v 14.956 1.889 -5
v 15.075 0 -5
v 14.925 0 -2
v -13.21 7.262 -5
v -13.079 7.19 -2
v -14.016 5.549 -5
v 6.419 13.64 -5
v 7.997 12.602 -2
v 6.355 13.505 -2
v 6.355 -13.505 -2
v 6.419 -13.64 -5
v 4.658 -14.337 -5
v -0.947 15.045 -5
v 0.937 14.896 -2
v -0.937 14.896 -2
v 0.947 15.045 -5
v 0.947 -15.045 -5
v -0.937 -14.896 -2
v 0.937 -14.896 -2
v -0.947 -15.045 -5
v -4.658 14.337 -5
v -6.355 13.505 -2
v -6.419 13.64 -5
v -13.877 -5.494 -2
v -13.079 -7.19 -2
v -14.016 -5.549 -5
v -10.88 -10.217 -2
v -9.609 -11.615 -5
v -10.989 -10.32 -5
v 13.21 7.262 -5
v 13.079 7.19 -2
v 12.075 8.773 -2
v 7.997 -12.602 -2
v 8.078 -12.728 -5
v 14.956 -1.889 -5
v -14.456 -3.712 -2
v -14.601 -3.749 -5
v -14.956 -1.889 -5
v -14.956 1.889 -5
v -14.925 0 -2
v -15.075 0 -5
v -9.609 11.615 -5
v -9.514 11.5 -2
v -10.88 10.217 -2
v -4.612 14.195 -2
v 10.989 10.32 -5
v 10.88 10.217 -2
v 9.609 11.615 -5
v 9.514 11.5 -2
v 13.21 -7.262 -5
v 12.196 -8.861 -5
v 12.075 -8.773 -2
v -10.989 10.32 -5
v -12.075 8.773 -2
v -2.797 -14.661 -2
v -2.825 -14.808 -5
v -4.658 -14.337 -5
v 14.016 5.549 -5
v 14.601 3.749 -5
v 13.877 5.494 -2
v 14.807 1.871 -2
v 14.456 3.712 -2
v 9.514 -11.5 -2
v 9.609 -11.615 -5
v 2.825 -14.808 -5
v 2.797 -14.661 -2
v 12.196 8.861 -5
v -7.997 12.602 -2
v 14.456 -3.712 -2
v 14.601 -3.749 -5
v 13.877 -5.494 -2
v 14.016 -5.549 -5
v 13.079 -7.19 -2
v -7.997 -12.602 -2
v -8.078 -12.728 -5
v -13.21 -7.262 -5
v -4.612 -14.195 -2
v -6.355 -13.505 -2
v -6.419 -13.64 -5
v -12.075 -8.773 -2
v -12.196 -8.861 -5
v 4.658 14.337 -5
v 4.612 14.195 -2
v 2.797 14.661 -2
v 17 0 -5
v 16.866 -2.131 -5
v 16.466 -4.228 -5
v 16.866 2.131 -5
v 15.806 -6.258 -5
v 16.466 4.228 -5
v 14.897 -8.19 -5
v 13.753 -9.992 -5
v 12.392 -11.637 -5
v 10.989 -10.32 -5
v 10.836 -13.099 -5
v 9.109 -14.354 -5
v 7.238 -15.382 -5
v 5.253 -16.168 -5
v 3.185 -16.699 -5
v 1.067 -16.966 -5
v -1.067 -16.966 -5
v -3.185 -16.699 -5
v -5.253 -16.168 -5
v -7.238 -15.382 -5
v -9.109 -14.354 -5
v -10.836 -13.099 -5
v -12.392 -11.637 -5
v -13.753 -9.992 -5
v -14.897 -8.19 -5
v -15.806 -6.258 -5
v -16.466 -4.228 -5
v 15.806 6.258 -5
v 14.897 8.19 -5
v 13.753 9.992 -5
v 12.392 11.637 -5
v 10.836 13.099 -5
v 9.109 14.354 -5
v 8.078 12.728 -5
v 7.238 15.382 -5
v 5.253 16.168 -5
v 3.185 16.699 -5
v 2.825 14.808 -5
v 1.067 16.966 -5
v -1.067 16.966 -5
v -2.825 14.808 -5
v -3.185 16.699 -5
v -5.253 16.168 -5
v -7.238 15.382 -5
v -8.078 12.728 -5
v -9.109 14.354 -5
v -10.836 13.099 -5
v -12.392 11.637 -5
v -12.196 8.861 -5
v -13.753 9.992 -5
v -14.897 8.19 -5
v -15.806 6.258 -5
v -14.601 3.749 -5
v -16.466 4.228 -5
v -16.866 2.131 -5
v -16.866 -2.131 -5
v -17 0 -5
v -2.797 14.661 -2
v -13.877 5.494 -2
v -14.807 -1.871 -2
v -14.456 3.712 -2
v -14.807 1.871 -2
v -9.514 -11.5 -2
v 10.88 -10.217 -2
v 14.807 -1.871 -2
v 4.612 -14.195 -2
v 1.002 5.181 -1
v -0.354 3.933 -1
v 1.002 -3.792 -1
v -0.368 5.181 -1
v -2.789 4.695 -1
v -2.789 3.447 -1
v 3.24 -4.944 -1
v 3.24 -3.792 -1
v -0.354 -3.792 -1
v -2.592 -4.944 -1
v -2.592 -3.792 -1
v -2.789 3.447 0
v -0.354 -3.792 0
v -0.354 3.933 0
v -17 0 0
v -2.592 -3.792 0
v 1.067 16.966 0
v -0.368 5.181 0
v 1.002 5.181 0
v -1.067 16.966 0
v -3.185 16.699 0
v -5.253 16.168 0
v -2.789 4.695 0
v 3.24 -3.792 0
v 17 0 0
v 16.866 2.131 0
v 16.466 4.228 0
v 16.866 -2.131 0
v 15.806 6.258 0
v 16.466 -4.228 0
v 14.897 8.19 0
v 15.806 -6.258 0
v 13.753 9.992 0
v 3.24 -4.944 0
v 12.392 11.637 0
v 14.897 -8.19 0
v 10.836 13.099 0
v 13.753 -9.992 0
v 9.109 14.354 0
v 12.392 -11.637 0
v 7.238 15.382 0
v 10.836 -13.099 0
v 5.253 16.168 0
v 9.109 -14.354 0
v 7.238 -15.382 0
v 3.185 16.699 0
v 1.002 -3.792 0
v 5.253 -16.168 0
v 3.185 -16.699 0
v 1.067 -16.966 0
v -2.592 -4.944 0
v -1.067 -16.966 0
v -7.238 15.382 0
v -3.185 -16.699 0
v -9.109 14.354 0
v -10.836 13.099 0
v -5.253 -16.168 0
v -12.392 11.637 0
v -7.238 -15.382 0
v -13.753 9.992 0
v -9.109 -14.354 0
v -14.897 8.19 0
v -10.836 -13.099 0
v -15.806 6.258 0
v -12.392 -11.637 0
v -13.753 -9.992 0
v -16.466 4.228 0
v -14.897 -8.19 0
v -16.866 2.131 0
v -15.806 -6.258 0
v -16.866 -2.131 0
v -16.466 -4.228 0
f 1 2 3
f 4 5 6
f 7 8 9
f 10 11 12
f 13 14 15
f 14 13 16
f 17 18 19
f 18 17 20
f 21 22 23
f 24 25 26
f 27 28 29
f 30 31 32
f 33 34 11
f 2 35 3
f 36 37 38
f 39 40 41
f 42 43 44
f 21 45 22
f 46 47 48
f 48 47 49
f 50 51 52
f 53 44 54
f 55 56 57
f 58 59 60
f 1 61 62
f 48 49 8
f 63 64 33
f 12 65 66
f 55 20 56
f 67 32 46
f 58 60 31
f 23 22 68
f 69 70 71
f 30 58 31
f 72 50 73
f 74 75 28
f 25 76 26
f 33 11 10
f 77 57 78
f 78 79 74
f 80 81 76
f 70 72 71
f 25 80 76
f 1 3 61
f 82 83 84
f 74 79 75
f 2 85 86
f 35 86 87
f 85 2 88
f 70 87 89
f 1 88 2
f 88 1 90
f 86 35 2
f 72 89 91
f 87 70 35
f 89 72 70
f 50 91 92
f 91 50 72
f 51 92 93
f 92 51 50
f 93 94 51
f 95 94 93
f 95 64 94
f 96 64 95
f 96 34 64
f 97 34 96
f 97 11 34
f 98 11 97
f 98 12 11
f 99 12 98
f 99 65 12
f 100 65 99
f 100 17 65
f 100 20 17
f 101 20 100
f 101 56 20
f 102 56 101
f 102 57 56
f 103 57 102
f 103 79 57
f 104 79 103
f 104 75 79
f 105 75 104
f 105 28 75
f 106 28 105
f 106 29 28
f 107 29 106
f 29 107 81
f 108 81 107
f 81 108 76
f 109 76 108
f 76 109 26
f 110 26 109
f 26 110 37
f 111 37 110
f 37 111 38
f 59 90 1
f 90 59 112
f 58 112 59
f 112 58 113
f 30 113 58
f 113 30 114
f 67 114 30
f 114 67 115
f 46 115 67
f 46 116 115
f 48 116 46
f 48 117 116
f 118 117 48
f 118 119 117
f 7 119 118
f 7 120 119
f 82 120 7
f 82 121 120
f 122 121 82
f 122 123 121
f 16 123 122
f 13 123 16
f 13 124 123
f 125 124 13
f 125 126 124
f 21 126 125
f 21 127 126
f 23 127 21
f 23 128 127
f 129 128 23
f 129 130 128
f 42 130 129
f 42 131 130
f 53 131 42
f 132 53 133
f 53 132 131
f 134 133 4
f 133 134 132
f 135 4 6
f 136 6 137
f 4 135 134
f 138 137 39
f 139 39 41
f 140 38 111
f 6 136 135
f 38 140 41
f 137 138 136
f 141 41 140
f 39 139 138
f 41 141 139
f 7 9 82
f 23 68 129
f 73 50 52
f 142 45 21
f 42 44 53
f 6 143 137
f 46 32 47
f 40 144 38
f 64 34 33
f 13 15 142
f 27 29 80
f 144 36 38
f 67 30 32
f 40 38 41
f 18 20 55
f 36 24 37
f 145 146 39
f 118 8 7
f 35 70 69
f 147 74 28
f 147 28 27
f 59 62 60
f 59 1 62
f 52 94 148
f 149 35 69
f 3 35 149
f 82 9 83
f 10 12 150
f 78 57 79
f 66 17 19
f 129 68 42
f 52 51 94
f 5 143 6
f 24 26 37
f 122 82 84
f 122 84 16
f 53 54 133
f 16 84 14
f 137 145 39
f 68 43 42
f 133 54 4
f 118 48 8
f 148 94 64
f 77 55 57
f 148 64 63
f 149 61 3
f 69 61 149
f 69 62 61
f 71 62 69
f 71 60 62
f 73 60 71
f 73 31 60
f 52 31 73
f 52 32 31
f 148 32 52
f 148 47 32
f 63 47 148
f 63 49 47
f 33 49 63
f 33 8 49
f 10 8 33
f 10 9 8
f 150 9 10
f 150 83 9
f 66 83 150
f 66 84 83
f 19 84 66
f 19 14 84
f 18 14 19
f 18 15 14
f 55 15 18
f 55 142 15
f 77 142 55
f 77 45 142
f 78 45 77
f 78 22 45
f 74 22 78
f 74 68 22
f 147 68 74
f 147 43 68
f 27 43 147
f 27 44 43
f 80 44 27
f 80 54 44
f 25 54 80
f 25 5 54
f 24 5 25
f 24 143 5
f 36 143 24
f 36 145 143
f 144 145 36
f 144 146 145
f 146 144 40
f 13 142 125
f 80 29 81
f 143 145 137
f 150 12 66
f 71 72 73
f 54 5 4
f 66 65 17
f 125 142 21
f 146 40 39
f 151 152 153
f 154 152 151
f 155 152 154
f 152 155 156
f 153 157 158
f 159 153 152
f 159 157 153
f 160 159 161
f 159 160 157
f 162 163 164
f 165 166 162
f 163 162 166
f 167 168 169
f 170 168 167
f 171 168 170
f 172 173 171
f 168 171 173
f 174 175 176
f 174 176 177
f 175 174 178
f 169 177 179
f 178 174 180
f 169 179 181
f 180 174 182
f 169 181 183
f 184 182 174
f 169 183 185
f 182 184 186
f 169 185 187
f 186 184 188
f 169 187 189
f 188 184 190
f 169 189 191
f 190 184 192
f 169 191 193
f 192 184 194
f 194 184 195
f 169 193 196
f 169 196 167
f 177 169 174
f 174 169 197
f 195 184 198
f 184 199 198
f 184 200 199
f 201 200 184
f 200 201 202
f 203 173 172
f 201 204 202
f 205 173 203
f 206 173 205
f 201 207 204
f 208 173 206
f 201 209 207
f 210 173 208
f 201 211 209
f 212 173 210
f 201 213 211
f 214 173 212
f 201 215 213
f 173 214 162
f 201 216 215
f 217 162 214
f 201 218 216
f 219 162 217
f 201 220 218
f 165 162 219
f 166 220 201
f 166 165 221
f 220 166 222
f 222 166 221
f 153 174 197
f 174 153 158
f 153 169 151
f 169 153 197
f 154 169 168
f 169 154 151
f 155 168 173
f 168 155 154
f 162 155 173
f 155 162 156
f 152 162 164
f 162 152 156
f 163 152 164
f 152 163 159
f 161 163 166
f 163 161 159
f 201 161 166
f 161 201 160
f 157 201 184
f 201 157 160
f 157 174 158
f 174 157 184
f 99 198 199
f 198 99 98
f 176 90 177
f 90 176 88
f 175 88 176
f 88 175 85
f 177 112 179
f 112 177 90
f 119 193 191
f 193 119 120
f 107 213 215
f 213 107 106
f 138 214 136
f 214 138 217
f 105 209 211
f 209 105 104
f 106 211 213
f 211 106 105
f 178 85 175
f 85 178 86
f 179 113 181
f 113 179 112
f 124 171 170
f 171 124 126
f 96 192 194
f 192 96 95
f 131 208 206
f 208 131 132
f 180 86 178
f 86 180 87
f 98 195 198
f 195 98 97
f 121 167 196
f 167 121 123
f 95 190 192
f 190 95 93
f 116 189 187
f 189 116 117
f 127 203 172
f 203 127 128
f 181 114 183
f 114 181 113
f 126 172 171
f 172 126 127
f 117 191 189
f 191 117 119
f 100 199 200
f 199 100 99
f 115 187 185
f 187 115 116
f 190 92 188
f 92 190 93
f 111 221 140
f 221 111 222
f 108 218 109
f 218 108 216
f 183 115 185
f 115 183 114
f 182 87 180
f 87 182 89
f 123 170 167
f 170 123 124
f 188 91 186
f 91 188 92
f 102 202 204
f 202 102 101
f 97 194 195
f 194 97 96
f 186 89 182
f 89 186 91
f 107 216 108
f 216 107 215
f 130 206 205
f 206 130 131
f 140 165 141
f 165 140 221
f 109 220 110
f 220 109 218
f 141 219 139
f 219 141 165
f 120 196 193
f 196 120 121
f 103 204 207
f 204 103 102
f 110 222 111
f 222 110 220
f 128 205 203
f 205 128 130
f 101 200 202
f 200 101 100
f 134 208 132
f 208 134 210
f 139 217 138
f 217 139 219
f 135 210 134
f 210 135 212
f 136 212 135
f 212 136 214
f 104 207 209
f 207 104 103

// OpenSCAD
$fn = 50;

difference() {
	union() {
		translate(v = [0, 0, -5.0]) {
			cylinder(h = 5, r = 17.0);
		}
	}
	union() {
		#translate(v = [0, 0, -5.0]) {
			cylinder(h = 3, r1 = 15.075, r2 = 14.925);
		}
		translate(v = [0, 0, -1]) {
			linear_extrude(height = 1) {
				text(font = "Impact", halign = "center", size = 10, text = "1", valign = "center");
			}
		}
	}
}
